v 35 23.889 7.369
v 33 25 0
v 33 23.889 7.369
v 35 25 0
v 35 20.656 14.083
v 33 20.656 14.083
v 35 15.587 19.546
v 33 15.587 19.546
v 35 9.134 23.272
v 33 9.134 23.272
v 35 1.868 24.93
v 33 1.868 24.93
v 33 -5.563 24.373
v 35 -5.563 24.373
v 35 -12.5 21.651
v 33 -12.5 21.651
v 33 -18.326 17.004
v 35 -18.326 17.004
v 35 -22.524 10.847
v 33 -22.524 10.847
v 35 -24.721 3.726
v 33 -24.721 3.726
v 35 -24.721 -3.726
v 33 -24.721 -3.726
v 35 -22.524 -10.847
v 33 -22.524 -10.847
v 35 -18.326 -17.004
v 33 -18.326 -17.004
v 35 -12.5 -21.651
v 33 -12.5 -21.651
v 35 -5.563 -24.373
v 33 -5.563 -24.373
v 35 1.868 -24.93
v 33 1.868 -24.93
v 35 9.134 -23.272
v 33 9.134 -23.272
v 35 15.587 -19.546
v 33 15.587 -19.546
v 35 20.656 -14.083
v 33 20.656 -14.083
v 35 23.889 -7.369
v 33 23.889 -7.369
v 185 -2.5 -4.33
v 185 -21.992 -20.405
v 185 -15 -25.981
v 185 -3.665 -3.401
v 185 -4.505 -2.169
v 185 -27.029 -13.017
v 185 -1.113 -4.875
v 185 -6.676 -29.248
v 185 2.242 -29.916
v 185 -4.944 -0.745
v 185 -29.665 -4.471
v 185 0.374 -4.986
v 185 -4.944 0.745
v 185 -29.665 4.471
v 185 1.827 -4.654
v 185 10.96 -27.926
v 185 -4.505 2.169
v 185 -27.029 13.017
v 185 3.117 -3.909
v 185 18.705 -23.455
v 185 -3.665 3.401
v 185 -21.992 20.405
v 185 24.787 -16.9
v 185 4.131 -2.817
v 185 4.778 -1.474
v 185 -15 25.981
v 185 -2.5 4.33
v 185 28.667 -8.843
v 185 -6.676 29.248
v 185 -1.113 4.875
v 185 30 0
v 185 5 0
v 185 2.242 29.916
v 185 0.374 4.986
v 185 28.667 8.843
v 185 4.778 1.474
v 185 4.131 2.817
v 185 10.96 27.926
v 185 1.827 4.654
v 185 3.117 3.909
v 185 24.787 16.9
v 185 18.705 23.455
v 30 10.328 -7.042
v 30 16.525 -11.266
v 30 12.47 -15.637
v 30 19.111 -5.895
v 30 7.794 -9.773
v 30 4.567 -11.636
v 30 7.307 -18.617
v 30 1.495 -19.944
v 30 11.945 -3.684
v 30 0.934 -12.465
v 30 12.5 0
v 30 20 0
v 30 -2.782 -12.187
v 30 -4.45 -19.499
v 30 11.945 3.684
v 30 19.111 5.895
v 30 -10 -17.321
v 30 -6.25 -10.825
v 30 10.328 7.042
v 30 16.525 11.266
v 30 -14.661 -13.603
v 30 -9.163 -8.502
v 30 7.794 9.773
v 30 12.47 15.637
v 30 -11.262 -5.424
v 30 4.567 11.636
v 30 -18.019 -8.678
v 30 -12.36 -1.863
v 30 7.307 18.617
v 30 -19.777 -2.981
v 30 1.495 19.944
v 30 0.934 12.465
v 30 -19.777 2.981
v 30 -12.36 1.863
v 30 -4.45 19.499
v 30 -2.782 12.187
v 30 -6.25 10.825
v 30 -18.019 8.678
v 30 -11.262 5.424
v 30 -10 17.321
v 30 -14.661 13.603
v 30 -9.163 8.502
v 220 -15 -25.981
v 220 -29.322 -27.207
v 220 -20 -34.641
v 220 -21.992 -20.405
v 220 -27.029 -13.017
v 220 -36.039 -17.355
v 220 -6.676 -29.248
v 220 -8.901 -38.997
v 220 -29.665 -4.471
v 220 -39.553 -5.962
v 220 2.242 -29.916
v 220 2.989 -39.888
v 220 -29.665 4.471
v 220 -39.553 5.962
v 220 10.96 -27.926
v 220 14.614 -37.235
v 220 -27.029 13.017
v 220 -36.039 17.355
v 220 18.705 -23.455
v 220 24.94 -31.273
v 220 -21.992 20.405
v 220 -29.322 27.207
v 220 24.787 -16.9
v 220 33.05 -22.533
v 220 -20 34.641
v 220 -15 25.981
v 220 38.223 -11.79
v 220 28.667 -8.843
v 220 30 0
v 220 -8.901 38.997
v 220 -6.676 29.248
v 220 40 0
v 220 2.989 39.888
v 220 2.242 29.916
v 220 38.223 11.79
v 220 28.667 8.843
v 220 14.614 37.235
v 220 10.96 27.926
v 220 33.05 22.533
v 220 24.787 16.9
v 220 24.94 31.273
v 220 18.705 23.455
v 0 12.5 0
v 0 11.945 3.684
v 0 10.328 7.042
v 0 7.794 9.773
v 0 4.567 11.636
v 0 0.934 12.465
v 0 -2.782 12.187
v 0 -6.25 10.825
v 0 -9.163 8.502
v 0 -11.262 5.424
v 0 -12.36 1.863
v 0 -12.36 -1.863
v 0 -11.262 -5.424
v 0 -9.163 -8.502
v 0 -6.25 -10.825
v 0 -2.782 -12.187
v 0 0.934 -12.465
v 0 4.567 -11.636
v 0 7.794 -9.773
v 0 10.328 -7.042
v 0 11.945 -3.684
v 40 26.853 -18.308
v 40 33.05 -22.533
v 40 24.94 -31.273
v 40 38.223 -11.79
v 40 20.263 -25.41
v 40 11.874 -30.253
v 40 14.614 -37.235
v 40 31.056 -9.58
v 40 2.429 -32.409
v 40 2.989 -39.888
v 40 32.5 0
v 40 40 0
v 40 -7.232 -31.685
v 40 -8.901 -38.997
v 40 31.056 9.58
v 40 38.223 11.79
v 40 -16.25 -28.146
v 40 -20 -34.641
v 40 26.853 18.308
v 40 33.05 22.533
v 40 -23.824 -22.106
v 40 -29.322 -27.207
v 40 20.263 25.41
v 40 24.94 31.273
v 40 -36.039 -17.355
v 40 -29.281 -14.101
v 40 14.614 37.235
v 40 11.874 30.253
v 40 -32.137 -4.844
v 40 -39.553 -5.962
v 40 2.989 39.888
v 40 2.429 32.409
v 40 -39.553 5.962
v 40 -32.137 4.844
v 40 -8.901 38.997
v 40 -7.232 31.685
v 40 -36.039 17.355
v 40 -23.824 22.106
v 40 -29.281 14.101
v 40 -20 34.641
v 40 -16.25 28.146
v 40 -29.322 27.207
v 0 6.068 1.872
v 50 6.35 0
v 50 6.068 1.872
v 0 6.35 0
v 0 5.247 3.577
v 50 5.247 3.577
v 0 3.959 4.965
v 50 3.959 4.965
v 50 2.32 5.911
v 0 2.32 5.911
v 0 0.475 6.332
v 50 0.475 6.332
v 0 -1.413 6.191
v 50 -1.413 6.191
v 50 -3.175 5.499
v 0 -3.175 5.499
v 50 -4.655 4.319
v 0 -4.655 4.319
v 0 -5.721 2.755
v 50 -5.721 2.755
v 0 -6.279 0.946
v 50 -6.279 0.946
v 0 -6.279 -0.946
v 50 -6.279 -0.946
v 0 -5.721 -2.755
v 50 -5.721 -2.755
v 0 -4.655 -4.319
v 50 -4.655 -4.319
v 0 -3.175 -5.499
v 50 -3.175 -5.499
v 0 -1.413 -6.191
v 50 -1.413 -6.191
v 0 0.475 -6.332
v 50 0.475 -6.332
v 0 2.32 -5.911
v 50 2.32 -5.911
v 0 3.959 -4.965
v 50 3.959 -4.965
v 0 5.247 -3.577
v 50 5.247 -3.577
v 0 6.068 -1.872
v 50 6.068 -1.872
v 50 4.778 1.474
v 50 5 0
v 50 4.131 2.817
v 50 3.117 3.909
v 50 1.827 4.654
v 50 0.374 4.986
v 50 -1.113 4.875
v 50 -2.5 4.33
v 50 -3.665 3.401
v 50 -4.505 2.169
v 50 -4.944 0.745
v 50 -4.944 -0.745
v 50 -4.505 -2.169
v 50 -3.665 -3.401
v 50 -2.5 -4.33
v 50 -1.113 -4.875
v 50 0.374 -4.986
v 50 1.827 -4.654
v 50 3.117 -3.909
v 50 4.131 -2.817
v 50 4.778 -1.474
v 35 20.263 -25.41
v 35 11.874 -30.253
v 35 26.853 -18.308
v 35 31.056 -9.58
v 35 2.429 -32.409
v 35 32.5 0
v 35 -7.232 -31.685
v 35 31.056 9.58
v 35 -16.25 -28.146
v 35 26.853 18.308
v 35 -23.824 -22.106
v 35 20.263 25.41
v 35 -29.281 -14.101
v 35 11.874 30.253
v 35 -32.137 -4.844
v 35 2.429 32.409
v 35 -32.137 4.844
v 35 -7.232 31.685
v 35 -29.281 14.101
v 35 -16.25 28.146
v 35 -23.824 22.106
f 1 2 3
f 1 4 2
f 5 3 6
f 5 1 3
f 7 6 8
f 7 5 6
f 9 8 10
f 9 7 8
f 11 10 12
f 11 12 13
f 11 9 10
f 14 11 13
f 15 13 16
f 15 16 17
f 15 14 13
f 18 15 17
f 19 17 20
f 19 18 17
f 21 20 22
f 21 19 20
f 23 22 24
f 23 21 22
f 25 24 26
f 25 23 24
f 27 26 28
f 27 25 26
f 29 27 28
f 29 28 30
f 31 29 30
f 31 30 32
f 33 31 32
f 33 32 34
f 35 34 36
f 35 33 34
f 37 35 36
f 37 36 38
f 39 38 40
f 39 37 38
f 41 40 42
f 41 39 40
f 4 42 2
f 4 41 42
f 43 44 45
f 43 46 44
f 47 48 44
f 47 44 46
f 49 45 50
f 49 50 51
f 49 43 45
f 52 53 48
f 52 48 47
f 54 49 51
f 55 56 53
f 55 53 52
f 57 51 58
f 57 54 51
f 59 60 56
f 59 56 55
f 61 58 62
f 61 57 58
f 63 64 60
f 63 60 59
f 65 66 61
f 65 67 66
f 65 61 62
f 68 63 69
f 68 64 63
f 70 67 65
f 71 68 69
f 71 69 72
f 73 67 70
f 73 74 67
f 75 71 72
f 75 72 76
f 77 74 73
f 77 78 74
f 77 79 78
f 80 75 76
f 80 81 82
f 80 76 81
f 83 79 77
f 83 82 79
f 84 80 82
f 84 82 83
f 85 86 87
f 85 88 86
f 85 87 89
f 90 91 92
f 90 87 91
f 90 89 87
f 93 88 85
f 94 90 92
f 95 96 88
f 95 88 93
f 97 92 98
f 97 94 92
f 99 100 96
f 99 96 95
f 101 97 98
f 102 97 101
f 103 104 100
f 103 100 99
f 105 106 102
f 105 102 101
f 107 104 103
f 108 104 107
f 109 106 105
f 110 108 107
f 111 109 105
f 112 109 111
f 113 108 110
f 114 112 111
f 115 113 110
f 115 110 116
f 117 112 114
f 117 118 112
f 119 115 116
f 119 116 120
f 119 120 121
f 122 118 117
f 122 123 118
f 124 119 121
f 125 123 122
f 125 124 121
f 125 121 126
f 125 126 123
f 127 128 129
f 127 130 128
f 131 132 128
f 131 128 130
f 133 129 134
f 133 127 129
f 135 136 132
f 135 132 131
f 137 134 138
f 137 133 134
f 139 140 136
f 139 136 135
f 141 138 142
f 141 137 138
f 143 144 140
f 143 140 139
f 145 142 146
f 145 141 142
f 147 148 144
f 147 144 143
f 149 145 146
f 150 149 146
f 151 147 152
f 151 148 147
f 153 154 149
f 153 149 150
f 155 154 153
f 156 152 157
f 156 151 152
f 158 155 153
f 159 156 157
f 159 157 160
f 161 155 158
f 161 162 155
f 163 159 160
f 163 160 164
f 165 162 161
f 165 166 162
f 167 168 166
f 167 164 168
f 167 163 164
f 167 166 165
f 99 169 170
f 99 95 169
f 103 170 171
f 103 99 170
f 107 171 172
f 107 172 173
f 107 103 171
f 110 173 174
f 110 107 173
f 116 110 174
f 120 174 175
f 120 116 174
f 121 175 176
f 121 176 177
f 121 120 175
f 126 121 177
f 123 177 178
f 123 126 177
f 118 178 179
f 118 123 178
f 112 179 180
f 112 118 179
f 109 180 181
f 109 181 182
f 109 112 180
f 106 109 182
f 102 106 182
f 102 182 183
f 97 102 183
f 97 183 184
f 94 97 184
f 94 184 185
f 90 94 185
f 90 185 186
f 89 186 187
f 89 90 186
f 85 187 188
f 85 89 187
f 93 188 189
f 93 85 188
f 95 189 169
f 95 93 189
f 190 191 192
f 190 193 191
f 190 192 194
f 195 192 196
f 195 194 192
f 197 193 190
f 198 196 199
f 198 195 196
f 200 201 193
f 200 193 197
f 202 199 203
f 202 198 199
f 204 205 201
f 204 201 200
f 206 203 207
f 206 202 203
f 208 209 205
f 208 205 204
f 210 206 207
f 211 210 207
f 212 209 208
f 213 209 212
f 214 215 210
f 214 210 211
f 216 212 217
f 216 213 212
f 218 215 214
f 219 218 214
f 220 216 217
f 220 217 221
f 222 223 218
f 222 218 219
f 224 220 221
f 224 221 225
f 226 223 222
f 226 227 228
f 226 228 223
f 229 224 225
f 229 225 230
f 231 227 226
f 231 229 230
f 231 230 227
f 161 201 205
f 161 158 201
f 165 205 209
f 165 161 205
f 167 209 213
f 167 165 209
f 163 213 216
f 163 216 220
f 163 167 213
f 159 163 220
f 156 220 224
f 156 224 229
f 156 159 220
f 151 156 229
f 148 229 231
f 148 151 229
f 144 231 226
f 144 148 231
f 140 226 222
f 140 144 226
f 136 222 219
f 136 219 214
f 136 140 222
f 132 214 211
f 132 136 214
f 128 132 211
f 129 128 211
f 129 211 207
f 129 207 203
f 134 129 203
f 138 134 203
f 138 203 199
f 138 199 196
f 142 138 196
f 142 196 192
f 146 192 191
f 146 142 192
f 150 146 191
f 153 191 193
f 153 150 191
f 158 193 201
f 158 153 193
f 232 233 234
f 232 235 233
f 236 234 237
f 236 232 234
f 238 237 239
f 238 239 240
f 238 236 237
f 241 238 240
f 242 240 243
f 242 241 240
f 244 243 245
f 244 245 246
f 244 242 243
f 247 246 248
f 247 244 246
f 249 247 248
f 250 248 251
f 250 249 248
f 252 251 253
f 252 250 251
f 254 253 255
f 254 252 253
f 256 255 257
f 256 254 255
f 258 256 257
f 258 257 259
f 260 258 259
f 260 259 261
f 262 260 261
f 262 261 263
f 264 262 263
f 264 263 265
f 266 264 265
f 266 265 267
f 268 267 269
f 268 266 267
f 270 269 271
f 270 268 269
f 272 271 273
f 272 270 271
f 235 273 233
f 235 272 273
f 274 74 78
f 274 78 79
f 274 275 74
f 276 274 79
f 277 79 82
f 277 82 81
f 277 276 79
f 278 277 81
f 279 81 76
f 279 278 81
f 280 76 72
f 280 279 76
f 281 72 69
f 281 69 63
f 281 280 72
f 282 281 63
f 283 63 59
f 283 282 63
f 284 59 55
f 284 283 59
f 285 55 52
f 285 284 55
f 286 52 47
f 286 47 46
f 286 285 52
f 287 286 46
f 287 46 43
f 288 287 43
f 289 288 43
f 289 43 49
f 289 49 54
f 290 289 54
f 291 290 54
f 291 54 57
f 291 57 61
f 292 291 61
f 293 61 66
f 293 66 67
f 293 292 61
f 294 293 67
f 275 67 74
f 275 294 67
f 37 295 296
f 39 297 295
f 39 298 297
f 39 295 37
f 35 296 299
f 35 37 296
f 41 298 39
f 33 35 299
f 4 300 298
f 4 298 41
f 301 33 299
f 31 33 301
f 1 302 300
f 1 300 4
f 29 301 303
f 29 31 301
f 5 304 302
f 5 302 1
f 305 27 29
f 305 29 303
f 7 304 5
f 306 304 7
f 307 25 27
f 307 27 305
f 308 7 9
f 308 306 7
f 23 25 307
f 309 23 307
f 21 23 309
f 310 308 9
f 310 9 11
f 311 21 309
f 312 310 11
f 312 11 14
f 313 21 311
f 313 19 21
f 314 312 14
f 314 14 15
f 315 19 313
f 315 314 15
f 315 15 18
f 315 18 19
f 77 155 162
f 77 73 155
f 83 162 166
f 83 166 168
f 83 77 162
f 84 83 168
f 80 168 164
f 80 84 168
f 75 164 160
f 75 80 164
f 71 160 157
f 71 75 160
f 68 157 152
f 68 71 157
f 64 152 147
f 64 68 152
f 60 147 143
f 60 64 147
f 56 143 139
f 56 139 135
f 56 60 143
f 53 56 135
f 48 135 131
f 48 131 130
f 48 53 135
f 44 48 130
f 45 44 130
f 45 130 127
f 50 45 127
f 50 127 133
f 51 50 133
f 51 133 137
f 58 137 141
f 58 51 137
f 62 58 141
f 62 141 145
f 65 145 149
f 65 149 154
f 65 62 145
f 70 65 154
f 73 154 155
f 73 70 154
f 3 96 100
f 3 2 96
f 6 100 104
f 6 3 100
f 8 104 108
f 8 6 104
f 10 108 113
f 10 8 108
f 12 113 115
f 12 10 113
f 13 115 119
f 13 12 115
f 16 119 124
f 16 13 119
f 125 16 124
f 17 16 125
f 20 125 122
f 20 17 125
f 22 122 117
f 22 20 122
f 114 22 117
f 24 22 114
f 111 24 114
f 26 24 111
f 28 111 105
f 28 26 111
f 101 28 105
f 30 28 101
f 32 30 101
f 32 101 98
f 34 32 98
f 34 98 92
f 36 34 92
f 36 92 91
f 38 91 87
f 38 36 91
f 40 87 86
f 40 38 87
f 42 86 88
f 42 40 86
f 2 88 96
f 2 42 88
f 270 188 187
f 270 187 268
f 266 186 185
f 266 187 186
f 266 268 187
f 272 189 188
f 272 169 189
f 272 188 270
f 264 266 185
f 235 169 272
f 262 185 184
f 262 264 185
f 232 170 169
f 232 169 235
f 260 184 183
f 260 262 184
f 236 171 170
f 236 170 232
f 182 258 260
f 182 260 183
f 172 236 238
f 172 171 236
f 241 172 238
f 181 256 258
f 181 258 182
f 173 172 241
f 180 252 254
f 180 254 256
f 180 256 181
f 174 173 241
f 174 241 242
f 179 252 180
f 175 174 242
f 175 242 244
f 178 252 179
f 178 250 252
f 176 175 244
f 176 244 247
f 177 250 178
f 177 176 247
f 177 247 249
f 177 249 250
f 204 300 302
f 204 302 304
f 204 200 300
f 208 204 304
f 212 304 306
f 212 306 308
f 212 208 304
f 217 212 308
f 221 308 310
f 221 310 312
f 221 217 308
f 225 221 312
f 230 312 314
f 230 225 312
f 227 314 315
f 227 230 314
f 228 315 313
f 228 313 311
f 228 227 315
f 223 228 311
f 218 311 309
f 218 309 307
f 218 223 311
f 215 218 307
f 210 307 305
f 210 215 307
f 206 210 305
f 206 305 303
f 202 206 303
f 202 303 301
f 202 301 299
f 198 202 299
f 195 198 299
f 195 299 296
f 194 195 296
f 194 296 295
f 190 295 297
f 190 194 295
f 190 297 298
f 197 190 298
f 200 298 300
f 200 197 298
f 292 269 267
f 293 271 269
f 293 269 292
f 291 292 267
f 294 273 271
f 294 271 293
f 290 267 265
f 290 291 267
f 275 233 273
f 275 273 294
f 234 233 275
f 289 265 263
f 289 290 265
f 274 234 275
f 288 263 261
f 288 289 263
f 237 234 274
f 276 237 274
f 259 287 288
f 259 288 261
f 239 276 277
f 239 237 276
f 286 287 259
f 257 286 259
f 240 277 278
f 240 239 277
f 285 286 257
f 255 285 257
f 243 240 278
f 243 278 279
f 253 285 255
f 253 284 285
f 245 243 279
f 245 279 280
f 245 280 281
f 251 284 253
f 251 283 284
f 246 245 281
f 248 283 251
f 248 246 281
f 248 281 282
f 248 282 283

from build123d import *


with BuildPart() as part:
    # Sketch1 → Revolve1 (revolve)
    with BuildSketch(Plane.XY):
        Polygon((0, 6.35), (0, 12.5), (30, 12.5), (30, 20), (33, 25), (35, 25), (35, 32.5), (40, 32.5), (40, 40), (220, 40), (220, 30), (185, 30), (185, 5), (50, 5), (50, 6.35), align=None)
    revolve(axis=Axis((1.424970928, 0, 0), (1, 0, 0)))


solid = part.part
